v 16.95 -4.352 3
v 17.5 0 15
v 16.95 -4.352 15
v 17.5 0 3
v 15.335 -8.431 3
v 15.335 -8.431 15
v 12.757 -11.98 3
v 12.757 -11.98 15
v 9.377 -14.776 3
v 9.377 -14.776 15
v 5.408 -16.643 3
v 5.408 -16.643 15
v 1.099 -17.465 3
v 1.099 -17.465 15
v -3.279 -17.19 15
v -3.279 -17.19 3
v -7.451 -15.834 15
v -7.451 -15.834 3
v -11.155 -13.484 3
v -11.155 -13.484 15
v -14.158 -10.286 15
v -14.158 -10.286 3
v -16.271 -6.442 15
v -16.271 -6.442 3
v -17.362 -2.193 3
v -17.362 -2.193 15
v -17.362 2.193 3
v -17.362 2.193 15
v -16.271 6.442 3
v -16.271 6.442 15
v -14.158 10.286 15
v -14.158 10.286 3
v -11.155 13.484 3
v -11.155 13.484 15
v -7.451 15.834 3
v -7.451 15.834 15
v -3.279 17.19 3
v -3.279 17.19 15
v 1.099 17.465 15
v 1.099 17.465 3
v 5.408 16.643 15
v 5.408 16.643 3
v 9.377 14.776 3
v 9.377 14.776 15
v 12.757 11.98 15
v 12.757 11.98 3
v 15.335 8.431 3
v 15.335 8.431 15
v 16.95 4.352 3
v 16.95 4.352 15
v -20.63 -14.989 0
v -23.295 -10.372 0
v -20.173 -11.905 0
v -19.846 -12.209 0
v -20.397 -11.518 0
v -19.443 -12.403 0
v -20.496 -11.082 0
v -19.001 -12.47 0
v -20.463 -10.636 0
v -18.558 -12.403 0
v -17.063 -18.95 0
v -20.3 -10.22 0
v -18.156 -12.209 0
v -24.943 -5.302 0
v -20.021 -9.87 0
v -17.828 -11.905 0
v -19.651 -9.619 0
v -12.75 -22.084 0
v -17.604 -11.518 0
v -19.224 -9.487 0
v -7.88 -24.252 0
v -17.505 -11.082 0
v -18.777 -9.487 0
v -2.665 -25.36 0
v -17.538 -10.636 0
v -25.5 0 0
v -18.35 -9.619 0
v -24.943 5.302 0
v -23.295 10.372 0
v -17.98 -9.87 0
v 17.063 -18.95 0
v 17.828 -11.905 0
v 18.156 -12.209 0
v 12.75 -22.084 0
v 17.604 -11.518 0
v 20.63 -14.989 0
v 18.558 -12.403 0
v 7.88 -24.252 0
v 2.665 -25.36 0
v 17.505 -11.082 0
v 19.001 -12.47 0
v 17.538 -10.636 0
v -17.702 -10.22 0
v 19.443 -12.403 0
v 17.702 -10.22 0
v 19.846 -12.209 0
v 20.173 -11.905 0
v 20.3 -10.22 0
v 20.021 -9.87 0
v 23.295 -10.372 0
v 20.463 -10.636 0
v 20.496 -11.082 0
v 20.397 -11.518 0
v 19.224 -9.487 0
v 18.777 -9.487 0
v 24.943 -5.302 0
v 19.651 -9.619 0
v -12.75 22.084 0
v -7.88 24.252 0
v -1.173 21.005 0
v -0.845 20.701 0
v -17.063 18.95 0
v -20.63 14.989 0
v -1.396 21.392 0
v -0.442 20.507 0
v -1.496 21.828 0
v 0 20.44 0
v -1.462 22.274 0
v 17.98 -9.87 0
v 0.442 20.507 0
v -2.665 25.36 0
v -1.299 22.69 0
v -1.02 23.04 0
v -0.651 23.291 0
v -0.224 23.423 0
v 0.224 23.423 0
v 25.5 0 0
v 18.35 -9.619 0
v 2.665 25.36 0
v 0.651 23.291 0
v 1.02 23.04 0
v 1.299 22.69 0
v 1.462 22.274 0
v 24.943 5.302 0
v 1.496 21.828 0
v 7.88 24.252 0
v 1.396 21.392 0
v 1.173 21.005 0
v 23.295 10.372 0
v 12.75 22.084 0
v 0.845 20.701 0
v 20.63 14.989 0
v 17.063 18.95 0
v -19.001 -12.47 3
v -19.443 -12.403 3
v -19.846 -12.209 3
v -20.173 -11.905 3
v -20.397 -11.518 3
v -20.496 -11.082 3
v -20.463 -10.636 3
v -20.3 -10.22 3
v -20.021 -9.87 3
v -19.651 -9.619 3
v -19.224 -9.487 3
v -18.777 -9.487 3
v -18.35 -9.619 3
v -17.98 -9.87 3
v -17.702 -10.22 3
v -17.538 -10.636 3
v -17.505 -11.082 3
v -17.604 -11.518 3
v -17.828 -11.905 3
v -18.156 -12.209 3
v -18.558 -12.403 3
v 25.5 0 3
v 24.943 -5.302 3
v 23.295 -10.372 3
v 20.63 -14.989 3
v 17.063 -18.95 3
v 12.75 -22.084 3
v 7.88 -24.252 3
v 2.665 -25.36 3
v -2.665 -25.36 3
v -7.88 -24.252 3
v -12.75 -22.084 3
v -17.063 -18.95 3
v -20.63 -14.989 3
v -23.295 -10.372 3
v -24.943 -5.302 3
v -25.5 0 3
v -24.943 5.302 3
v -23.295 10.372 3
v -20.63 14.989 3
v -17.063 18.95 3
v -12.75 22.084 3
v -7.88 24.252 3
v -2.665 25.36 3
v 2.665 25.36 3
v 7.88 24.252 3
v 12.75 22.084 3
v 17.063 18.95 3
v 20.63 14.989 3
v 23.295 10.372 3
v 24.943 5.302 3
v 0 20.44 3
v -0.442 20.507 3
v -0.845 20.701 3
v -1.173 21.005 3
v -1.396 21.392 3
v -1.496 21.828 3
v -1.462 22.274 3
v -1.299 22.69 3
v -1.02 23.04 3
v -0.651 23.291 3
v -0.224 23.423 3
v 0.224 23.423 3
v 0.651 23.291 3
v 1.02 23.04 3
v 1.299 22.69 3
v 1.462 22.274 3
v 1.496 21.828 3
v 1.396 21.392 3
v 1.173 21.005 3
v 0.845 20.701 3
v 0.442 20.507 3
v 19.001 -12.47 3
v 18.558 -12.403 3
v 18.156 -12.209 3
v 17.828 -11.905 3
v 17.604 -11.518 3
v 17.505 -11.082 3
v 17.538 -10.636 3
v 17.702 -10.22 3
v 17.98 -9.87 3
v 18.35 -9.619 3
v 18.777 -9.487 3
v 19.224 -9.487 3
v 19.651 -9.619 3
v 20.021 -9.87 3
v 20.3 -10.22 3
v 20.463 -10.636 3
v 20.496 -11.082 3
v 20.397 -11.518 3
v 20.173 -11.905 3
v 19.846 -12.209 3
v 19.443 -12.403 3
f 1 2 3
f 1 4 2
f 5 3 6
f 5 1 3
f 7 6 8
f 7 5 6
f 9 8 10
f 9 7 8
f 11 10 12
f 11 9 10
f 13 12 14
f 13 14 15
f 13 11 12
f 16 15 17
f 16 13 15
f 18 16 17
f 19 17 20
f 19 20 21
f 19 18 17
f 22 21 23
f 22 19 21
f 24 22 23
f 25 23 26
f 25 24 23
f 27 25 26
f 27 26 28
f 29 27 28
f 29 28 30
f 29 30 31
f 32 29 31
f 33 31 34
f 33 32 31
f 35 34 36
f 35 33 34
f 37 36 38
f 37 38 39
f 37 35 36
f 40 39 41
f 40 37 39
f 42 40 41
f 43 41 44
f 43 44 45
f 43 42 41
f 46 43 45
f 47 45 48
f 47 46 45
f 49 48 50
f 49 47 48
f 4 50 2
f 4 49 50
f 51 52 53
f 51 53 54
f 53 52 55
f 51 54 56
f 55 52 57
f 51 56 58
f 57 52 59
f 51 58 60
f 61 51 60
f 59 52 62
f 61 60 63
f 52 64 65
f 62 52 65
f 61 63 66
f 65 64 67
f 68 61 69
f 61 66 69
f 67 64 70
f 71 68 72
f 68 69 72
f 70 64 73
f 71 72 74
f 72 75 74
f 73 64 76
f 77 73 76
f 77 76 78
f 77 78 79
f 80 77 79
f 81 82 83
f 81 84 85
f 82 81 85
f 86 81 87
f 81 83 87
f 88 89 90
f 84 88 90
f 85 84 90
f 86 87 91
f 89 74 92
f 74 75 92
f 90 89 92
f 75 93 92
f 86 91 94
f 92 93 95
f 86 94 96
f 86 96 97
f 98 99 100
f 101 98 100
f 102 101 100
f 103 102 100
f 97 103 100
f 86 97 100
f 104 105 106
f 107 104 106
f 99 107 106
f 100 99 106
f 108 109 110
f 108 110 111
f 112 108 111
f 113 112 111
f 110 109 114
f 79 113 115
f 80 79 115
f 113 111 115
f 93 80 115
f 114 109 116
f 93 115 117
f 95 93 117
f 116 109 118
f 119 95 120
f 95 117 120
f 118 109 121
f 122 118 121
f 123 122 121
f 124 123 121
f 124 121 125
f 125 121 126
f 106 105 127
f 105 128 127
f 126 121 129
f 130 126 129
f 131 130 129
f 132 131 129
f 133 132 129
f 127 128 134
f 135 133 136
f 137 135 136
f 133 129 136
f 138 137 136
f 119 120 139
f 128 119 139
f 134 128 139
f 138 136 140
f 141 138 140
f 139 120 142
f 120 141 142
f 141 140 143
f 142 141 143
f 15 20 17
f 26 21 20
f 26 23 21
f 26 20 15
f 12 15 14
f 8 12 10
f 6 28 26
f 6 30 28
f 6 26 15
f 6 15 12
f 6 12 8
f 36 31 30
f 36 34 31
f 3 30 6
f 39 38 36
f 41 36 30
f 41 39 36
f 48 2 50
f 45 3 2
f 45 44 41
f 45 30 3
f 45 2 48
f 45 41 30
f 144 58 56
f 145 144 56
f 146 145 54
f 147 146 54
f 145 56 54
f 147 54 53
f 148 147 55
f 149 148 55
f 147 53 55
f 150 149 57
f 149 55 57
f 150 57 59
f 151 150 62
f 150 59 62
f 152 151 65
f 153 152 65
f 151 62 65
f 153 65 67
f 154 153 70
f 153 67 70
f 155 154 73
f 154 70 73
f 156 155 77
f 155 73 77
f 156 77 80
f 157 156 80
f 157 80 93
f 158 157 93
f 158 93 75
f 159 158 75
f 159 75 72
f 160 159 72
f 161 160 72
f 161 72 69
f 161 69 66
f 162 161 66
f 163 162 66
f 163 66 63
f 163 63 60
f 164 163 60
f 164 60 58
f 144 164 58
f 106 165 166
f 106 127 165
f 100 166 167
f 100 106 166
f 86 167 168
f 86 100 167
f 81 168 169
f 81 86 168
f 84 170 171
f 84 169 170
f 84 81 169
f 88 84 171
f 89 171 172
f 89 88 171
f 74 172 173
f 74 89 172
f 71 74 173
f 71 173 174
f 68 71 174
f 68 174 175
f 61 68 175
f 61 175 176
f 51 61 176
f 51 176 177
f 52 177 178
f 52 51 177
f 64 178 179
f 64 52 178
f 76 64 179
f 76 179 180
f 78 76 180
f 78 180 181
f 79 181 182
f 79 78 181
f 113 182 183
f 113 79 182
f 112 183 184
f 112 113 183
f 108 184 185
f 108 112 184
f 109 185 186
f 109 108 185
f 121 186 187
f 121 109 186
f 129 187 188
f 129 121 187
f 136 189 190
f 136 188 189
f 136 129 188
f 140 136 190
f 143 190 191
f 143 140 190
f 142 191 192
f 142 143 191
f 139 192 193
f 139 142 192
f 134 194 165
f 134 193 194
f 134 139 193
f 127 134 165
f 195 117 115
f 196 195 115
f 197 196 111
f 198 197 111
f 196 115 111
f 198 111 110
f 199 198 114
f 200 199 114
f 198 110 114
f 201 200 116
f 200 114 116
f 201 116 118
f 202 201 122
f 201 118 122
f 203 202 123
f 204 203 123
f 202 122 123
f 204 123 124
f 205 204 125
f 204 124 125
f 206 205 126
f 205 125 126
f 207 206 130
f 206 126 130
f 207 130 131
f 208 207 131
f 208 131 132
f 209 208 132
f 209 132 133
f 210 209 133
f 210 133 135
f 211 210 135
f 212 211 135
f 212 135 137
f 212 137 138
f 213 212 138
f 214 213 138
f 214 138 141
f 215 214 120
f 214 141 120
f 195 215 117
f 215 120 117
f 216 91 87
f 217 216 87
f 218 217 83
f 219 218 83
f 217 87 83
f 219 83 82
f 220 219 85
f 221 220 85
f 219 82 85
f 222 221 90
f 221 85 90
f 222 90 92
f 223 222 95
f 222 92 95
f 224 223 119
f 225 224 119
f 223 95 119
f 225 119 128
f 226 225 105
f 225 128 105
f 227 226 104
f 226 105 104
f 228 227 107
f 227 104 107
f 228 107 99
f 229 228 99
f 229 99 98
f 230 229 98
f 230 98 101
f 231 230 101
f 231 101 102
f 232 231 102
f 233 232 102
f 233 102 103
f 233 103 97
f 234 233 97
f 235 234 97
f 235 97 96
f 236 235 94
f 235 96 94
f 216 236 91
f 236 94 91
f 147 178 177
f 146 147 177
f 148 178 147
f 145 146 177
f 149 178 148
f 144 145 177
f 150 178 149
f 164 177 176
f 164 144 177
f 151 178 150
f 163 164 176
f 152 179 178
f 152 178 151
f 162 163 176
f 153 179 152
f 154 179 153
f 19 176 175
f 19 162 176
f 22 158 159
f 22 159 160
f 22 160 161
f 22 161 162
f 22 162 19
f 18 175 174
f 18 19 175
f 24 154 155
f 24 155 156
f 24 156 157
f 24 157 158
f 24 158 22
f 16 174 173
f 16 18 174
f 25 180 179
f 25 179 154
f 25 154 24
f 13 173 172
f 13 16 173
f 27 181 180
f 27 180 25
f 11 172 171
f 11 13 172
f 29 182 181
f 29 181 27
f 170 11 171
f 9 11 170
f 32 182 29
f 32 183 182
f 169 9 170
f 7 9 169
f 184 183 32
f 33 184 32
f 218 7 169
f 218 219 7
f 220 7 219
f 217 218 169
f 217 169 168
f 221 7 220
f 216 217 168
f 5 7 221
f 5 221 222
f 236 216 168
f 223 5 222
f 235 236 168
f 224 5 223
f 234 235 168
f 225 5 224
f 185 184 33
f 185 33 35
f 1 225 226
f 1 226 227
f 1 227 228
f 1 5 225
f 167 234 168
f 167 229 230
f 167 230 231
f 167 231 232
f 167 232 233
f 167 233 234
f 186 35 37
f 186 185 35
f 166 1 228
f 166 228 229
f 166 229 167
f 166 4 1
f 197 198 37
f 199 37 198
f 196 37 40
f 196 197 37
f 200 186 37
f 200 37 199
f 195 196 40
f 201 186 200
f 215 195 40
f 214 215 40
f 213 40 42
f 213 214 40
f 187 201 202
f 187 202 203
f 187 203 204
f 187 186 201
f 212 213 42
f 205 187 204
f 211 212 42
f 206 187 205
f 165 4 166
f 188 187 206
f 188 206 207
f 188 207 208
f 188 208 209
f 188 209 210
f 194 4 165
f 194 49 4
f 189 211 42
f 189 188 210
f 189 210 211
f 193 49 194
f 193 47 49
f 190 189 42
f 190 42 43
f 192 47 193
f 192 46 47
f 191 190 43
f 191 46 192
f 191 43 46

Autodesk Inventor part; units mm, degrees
ref_plane "YZ Plane" through (0, 0, 0) normal (1, 0, 0) x (0, 1, 0)
ref_plane "XZ Plane" through (0, 0, 0) normal (0, 1, 0) x (-1, 0, 0)
ref_plane "XY Plane" through (0, 0, 0) normal (0, 0, 1) x (1, 0, 0)
sketch "Esboço1" plane through (0, 0, 0) normal (0, 0, 1) x (1, 0, 0)
  circle A0 centre (0, 0) radius 25.5
  dimension "d0" = 51
extrude "Extrusão1" add sketch "Esboço1" along normal blind 3
sketch "Esboço2" plane through (0, 0, 3) normal (0, 0, 1) x (1, 0, 0)
  circle A0 centre (0, 0) radius 17.5
  circle A1 centre (-0.0486, 21.9399) radius 1.5
  line L0 (-0.0486, 17.4999) -> (-0.0486, -17.4999)
  dimension "d3" = 35
  dimension "d4" = 21.94
  dimension "d5" = 3
extrude "Extrusão2" add sketch "Esboço2" along normal blind 12 contours A0 L0 | L0 A0
sketch "Esboço3" plane through (0, 0, 3) normal (0, 0, 1) x (1, 0, 0)
  circle A0 centre (0, 0) radius 17.5 projected
  point P0 (0, 21.94)
  point P1 (-19.0006, -10.97)
  point P2 (19.0006, -10.97)
  dimension "d8" = 21.94
  dimension "d11" = 360
hole "Furo1" at (0, 21.94, 3) at (-19.0006, -10.97, 3) at (19.0006, -10.97, 3) direction (0, 0, -1) diameter 3 end through all
properties part number "Motor mesh" material "Alumínio 6061"
